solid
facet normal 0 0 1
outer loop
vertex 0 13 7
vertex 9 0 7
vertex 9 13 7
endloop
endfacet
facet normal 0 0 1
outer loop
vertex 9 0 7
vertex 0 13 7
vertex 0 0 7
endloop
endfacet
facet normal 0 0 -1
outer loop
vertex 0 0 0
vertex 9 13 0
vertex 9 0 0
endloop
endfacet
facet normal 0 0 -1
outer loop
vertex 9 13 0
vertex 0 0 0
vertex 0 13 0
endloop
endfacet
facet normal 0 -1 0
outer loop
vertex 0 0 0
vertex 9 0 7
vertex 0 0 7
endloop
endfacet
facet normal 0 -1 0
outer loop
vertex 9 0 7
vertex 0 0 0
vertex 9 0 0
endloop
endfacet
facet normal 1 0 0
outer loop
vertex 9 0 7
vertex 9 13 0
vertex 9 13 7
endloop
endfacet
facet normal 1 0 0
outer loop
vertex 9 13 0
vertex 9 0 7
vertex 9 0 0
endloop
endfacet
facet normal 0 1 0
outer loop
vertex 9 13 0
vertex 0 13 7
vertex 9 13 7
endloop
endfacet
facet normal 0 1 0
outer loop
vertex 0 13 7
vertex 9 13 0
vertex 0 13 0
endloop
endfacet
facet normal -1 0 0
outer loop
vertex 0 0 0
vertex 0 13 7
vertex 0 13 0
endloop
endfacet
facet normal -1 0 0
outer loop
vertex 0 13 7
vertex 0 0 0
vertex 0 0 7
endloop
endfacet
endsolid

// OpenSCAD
// Generated by SolidPython 1.0.1 on 2020-07-29 00:46:55


cube(size = [9, 13, 7]);
/***********************************************
*********      SolidPython code:      **********
************************************************
 
# import packages: SolidPython
from solid import *
from solid.utils import *
from itertools import chain, combinations, permutations


class Resize:

    def __init__(self, scad_file):
        self.scad_file = scad_file
        #self.scad_file = import_scad(scad_file)
        # cone/cylinder param:
        self.r1 = 0
        self.r2 = 0
        self.h = 0
        # rectangular prism param:
        self.w = 0
        self.l = 0
        # ellipse param:
        self.r = 0

    # import OpenScad code (file name corresponds to shape)


    # classify shape + parameters
    def assign(self, param1, param2, param3):
        if self.scad_file == 'cone.scad':
            self.r1 = param1
            self.r2 = param2
            self.h = param3
        elif self.scad_file == 'cylinder.scad':
            self.r1 = param1
            self.r2 = param2
            self.h = param3
        elif self.scad_file == 'rectangularPrism.scad':
            self.h = param1
            self.l = param2
            self.w = param3
        else:
            self.r = param1
            self.h = param2

    # resize parameters
    def iterate(self):
        x = range(3, 20, 2)
        i = 1
        if self.scad_file == 'cone.scad':
            tempList = list(permutations(x, 2))
            for temp in tempList:
                param1 = temp[0]
                param2 = temp[1]
                filepath = 'produced_scad_files/' + 'cone' + str(param1) + '_' + str(param2) + '_' + '.scad'
                scad_render_to_file(cylinder(h=param1, r1=param2, r2=0), filepath)

        elif self.scad_file == 'cylinder.scad':
            tempList = list(permutations(x, 3))
            for temp in tempList:
                param1 = temp[0]
                param2 = temp[1]
                filepath = 'produced_scad_files/' + 'cylinder' + str(param1) + '_' + str(param2) + '_' + '.scad'
                scad_render_to_file(cylinder(h=param1, r1=param2, r2=param2), filepath)

        elif self.scad_file == 'rectangularPrism.scad':
            tempList = list(permutations(x, 3))
            for temp in tempList:
                param1 = temp[0]
                param2 = temp[1]
                param3 = temp[2]
                filepath = 'produced_scad_files/' + 'rectangularPrism' + str(param1) + '_' + str(param2) + '_' + str(
                    param3) + '.scad'
                scad_render_to_file(cube(size=(param1, param2, param3)), filepath)

        elif self.scad_file == 'ellipse.scad':
            tempList = list(permutations(x, 4))
            for temp in tempList:
                param1 = temp[0]
                param2 = temp[1]
                param3 = temp[2]
                param4 = temp[3]
                filepath = 'produced_scad_files/' + 'ellipse' + str(param1) + '_' + str(param2) + '_' + str(param3) + '_' + str(param4) + '.scad'
                scad_render_to_file(scale([param1, param2, param3])(sphere(r=param4)), filepath)

    def render_to_scadfile(self):
        scad_render_to_file(scad, 'example.scad') 
 
************************************************/
